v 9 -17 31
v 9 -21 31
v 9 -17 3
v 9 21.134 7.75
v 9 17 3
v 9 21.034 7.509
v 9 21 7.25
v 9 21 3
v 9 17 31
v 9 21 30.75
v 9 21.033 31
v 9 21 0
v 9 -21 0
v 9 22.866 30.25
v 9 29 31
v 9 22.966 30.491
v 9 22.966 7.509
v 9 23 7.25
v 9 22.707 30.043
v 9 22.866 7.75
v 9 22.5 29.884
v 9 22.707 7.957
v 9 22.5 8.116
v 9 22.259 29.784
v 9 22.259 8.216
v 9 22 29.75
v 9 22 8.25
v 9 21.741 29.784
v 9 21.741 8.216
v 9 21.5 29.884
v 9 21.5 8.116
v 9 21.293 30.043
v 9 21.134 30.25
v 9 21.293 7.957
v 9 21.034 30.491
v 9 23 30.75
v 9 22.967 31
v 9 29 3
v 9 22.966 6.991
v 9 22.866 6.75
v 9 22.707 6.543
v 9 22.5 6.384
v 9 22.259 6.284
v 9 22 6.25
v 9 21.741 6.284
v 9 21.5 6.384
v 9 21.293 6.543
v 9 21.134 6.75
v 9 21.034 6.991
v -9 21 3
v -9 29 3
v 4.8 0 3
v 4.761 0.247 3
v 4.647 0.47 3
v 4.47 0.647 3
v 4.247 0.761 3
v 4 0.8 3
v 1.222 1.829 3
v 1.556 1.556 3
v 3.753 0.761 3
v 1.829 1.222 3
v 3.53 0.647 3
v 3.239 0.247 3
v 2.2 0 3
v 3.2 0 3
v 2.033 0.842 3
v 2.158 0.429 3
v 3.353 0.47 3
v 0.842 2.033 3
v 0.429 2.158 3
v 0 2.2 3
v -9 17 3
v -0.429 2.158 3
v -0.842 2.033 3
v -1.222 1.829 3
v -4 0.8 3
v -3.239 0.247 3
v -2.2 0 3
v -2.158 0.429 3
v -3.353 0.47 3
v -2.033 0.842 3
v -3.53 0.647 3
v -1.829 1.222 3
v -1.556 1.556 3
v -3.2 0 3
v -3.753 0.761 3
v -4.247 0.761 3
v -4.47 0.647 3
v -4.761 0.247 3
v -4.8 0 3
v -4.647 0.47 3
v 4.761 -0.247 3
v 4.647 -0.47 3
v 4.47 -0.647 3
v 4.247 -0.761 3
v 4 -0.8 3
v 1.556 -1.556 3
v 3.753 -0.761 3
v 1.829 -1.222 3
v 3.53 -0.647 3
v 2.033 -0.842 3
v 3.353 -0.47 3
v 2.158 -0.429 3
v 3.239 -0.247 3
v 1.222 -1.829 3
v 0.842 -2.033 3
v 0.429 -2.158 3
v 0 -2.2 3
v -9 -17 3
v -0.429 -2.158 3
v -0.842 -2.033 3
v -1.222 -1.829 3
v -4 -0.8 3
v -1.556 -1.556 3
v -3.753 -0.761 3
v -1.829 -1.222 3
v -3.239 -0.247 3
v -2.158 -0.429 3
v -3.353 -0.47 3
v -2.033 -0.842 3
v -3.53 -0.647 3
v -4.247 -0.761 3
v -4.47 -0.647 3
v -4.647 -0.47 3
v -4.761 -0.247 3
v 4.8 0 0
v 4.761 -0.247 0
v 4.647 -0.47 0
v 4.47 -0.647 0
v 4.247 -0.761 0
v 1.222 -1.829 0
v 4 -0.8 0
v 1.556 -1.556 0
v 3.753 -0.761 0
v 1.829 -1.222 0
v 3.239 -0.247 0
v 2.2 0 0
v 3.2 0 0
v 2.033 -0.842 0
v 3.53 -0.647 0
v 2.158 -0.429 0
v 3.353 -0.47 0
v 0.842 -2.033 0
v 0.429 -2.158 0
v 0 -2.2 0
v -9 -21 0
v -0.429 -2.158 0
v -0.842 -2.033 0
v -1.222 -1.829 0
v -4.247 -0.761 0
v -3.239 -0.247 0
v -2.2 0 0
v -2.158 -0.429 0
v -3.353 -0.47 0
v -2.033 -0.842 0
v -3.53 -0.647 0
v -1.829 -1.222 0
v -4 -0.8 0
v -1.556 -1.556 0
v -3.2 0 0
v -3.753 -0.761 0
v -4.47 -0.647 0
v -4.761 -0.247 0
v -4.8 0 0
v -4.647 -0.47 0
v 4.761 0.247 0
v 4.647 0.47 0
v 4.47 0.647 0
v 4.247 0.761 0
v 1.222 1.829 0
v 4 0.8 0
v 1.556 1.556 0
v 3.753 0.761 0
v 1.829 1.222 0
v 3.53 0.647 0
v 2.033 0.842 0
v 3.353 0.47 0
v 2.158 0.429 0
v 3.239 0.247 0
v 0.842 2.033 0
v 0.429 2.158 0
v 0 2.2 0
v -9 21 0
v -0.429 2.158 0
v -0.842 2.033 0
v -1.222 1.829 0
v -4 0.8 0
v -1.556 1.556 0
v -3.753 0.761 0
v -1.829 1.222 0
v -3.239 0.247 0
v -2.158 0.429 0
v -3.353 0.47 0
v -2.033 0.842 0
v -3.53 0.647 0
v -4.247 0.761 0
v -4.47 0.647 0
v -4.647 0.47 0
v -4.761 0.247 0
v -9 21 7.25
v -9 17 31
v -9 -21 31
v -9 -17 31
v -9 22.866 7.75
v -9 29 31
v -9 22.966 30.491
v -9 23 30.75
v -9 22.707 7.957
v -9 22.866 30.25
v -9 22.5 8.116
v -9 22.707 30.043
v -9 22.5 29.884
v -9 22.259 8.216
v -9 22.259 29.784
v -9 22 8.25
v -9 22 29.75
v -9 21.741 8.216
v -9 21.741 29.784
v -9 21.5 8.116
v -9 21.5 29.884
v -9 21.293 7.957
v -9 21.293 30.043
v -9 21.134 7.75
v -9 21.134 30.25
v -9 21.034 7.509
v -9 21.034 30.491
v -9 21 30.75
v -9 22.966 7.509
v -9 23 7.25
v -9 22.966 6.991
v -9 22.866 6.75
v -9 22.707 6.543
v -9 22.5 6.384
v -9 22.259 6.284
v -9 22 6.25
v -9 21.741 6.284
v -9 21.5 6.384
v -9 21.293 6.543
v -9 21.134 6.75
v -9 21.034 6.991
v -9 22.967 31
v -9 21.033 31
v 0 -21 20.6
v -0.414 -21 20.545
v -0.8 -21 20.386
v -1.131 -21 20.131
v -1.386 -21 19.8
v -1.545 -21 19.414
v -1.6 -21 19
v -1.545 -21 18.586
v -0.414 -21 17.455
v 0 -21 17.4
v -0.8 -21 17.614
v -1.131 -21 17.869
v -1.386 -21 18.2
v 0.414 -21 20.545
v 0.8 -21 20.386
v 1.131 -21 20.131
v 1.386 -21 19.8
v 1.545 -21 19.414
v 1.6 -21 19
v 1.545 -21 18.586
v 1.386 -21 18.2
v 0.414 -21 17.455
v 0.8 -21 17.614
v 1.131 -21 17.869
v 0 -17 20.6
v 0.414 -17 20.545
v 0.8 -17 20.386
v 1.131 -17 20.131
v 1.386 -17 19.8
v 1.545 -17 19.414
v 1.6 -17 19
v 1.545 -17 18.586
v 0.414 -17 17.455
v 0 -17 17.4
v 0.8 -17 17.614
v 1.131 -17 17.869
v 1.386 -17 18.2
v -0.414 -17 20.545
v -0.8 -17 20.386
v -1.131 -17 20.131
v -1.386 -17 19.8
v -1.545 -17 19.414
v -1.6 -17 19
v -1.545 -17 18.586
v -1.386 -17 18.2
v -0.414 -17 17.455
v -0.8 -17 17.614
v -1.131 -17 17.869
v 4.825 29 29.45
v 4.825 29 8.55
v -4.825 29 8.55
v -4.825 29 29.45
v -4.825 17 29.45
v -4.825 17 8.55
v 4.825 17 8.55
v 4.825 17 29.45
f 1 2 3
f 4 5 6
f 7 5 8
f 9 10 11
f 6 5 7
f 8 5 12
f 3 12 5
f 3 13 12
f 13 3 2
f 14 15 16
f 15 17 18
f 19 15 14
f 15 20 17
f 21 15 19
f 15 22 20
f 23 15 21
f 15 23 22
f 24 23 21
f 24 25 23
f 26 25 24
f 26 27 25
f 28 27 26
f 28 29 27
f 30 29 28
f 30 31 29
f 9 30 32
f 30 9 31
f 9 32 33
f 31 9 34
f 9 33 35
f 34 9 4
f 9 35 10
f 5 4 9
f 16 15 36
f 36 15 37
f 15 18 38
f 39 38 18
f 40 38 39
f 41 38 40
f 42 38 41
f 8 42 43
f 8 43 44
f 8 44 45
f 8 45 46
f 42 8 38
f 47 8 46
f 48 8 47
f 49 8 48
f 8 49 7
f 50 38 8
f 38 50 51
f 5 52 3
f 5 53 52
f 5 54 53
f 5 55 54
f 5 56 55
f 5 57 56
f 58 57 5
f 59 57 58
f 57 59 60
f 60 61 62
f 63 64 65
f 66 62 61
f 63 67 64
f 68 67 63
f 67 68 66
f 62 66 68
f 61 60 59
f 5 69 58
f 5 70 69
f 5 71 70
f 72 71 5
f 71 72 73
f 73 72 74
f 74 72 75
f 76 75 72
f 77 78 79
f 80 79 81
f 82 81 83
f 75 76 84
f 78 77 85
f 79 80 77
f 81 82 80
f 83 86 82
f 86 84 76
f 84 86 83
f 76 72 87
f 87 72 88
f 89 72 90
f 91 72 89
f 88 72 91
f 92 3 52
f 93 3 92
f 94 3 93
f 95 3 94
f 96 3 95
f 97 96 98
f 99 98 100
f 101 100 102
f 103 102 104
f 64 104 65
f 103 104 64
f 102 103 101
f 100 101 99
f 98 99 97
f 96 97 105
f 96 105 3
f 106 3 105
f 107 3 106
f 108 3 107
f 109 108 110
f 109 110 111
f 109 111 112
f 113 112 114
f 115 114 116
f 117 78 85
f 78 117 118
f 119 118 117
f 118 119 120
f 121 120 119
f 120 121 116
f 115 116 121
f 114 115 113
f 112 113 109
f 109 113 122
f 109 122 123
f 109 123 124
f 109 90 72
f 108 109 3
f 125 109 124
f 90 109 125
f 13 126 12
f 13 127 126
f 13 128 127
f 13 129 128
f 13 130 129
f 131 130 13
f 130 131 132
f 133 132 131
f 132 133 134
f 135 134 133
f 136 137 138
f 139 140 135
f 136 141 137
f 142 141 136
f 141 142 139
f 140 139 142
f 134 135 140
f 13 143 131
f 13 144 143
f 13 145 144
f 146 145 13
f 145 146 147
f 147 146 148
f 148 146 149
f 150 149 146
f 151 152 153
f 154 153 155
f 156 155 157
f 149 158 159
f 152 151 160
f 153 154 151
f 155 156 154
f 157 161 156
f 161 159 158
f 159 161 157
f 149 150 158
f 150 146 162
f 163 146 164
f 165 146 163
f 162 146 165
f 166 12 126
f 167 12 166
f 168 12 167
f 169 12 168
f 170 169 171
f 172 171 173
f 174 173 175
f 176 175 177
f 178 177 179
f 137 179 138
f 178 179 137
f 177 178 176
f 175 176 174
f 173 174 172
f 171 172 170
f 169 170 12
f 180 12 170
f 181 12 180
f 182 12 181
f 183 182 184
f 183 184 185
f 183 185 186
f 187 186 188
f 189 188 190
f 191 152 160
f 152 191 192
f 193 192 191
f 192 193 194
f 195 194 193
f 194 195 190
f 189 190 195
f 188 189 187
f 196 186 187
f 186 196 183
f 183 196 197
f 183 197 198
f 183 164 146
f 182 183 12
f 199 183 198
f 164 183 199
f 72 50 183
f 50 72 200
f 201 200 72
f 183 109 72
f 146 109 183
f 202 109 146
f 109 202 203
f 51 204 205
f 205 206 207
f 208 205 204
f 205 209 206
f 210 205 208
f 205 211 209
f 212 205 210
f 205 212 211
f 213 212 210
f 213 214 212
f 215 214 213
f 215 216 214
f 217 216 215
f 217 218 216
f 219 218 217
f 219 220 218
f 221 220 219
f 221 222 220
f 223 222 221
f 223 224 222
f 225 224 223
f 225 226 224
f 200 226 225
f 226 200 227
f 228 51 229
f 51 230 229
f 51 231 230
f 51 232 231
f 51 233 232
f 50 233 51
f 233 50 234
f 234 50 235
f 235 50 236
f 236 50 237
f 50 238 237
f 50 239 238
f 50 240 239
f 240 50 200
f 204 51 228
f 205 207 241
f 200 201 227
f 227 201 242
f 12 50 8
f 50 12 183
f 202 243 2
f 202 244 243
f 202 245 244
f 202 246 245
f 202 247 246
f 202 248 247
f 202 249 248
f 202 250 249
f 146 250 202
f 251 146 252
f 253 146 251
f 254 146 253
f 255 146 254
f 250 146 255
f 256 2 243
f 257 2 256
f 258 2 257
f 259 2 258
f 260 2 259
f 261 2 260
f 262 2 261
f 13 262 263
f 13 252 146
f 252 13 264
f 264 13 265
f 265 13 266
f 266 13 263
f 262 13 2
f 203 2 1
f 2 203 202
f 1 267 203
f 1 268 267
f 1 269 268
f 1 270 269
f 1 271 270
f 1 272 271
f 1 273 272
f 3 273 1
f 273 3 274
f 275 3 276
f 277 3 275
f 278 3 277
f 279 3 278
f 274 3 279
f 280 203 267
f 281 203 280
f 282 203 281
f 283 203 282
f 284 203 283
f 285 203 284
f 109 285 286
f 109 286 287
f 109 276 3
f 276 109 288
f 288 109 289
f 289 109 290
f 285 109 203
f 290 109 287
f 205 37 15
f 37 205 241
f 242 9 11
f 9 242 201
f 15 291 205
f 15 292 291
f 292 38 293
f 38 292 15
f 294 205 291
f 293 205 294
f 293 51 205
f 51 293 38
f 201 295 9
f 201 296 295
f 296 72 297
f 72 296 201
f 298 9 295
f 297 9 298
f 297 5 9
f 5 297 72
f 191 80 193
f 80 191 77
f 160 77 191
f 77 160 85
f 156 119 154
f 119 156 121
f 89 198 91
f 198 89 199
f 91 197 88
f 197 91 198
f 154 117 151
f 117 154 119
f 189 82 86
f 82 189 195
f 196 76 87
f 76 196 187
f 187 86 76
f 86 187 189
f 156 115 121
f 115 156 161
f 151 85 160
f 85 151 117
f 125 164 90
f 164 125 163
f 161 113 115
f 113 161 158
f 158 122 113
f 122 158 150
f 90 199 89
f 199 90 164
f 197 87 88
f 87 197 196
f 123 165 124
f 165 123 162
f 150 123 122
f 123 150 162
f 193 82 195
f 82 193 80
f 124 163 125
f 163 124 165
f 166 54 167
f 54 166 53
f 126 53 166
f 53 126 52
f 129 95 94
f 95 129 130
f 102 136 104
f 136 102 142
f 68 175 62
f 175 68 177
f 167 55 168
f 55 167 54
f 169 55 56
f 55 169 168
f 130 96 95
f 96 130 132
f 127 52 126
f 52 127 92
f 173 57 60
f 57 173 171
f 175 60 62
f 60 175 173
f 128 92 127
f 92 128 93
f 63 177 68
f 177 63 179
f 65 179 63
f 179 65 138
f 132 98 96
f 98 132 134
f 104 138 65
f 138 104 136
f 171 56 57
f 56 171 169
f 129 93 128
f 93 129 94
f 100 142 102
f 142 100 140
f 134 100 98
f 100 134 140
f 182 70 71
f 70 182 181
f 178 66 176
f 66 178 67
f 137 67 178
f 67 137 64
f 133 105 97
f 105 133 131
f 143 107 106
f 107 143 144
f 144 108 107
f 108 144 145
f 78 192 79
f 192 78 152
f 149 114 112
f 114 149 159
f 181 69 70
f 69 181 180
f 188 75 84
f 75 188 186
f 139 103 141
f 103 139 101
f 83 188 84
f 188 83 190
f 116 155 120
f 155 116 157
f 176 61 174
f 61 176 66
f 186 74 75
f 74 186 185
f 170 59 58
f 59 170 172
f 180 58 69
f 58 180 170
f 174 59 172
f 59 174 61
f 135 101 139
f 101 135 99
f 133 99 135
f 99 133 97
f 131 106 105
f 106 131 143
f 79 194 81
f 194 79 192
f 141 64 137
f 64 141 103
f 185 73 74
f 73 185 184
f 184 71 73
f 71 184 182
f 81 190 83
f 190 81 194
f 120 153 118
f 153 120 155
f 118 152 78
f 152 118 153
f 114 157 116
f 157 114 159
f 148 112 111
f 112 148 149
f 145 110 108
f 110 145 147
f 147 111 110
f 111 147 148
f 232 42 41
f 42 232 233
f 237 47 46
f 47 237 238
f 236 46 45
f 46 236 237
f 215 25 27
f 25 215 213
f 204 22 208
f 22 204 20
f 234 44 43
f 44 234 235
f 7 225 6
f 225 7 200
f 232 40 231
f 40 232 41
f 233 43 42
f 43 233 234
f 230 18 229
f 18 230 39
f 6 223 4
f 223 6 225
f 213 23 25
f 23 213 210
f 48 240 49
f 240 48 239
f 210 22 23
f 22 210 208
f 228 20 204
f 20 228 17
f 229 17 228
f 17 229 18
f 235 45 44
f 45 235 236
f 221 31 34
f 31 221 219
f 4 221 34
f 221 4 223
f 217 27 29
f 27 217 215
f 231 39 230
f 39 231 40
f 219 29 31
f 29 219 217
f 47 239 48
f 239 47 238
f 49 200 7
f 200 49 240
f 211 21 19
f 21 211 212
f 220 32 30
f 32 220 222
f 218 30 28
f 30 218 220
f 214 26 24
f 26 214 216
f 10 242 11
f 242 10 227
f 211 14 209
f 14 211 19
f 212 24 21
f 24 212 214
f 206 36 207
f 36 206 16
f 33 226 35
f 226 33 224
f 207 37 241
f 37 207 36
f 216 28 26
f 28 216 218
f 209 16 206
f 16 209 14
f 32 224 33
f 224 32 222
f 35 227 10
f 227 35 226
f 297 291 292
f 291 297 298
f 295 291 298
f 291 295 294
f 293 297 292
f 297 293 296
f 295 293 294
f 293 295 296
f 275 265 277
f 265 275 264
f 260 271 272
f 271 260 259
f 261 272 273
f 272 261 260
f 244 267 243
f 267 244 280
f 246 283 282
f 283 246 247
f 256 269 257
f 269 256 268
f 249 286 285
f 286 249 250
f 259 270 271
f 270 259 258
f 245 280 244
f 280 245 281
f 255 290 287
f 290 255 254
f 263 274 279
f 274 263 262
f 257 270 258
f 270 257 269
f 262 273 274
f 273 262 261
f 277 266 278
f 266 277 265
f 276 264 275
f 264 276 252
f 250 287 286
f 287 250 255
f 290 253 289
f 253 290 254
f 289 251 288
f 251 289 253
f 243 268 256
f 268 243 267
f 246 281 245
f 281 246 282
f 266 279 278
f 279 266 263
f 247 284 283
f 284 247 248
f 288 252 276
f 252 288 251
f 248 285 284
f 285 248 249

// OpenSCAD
// file: ../../lib/arbi.scad
// Shared ARBI OpenSCAD helpers.
// Units: millimetres. License: AGPL-3.0-only.

ARBI_EPSILON = 0.02;
ARBI_DEFAULT_FACETS = 96;

module arbi_tube(
    outer_diameter,
    inner_diameter,
    height,
    center = false,
    facets = ARBI_DEFAULT_FACETS
) {
    assert(outer_diameter > inner_diameter, "Tube outer diameter must exceed inner diameter.");
    assert(inner_diameter >= 0, "Tube inner diameter cannot be negative.");
    assert(height > 0, "Tube height must be positive.");

    difference() {
        cylinder(d = outer_diameter, h = height, center = center, $fn = facets);
        translate([0, 0, center ? 0 : -ARBI_EPSILON])
            cylinder(
                d = inner_diameter,
                h = height + 2 * ARBI_EPSILON,
                center = center,
                $fn = facets
            );
    }
}

module arbi_rounded_box(
    size,
    radius,
    center = false,
    facets = ARBI_DEFAULT_FACETS
) {
    assert(len(size) == 3, "Rounded-box size must have three dimensions.");
    assert(min(size) > 0, "Rounded-box dimensions must be positive.");
    assert(radius > 0, "Rounded-box radius must be positive.");
    assert(2 * radius <= min(size[0], size[1]), "Rounded-box radius is too large.");

    offset = center ? [0, 0, 0] : [size[0] / 2, size[1] / 2, size[2] / 2];

    translate(offset)
        hull()
            for (x = [-size[0] / 2 + radius, size[0] / 2 - radius])
                for (y = [-size[1] / 2 + radius, size[1] / 2 - radius])
                    translate([x, y, 0])
                        cylinder(r = radius, h = size[2], center = true, $fn = facets);
}

module arbi_capsule_bar(
    length,
    width,
    height,
    center = true,
    facets = ARBI_DEFAULT_FACETS
) {
    assert(length >= width, "Capsule length must be at least its width.");
    assert(width > 0 && height > 0, "Capsule dimensions must be positive.");

    offset = center ? [0, 0, 0] : [length / 2, width / 2, height / 2];

    translate(offset)
        hull()
            for (x = [-(length - width) / 2, (length - width) / 2])
                translate([x, 0, 0])
                    cylinder(d = width, h = height, center = true, $fn = facets);
}

module arbi_bolt_circle(
    count,
    radius,
    hole_diameter,
    height,
    phase = 0,
    facets = ARBI_DEFAULT_FACETS
) {
    assert(count >= 1, "Bolt-circle count must be positive.");
    assert(radius > 0 && hole_diameter > 0 && height > 0, "Bolt-circle dimensions must be positive.");

    for (index = [0 : count - 1])
        rotate([0, 0, phase + index * 360 / count])
            translate([radius, 0, 0])
                cylinder(d = hole_diameter, h = height, center = true, $fn = facets);
}

// Product appearance only; colors do not specify material or validation status.
ARBI_SHELL = [0.94, 0.94, 0.92];
ARBI_CORE = [0.12, 0.14, 0.15];
ARBI_METAL = [0.66, 0.70, 0.73];
// main file
// ARBI camera-gimbal-yoke 0.1.0 — concept-unvalidated.
// Canonical source in millimetres. Horn indexing, tilt axis and collision envelope are unresolved.

include <../../lib/camera-pod.scad>

color(ARBI_CORE)camera_gimbal_yoke();
